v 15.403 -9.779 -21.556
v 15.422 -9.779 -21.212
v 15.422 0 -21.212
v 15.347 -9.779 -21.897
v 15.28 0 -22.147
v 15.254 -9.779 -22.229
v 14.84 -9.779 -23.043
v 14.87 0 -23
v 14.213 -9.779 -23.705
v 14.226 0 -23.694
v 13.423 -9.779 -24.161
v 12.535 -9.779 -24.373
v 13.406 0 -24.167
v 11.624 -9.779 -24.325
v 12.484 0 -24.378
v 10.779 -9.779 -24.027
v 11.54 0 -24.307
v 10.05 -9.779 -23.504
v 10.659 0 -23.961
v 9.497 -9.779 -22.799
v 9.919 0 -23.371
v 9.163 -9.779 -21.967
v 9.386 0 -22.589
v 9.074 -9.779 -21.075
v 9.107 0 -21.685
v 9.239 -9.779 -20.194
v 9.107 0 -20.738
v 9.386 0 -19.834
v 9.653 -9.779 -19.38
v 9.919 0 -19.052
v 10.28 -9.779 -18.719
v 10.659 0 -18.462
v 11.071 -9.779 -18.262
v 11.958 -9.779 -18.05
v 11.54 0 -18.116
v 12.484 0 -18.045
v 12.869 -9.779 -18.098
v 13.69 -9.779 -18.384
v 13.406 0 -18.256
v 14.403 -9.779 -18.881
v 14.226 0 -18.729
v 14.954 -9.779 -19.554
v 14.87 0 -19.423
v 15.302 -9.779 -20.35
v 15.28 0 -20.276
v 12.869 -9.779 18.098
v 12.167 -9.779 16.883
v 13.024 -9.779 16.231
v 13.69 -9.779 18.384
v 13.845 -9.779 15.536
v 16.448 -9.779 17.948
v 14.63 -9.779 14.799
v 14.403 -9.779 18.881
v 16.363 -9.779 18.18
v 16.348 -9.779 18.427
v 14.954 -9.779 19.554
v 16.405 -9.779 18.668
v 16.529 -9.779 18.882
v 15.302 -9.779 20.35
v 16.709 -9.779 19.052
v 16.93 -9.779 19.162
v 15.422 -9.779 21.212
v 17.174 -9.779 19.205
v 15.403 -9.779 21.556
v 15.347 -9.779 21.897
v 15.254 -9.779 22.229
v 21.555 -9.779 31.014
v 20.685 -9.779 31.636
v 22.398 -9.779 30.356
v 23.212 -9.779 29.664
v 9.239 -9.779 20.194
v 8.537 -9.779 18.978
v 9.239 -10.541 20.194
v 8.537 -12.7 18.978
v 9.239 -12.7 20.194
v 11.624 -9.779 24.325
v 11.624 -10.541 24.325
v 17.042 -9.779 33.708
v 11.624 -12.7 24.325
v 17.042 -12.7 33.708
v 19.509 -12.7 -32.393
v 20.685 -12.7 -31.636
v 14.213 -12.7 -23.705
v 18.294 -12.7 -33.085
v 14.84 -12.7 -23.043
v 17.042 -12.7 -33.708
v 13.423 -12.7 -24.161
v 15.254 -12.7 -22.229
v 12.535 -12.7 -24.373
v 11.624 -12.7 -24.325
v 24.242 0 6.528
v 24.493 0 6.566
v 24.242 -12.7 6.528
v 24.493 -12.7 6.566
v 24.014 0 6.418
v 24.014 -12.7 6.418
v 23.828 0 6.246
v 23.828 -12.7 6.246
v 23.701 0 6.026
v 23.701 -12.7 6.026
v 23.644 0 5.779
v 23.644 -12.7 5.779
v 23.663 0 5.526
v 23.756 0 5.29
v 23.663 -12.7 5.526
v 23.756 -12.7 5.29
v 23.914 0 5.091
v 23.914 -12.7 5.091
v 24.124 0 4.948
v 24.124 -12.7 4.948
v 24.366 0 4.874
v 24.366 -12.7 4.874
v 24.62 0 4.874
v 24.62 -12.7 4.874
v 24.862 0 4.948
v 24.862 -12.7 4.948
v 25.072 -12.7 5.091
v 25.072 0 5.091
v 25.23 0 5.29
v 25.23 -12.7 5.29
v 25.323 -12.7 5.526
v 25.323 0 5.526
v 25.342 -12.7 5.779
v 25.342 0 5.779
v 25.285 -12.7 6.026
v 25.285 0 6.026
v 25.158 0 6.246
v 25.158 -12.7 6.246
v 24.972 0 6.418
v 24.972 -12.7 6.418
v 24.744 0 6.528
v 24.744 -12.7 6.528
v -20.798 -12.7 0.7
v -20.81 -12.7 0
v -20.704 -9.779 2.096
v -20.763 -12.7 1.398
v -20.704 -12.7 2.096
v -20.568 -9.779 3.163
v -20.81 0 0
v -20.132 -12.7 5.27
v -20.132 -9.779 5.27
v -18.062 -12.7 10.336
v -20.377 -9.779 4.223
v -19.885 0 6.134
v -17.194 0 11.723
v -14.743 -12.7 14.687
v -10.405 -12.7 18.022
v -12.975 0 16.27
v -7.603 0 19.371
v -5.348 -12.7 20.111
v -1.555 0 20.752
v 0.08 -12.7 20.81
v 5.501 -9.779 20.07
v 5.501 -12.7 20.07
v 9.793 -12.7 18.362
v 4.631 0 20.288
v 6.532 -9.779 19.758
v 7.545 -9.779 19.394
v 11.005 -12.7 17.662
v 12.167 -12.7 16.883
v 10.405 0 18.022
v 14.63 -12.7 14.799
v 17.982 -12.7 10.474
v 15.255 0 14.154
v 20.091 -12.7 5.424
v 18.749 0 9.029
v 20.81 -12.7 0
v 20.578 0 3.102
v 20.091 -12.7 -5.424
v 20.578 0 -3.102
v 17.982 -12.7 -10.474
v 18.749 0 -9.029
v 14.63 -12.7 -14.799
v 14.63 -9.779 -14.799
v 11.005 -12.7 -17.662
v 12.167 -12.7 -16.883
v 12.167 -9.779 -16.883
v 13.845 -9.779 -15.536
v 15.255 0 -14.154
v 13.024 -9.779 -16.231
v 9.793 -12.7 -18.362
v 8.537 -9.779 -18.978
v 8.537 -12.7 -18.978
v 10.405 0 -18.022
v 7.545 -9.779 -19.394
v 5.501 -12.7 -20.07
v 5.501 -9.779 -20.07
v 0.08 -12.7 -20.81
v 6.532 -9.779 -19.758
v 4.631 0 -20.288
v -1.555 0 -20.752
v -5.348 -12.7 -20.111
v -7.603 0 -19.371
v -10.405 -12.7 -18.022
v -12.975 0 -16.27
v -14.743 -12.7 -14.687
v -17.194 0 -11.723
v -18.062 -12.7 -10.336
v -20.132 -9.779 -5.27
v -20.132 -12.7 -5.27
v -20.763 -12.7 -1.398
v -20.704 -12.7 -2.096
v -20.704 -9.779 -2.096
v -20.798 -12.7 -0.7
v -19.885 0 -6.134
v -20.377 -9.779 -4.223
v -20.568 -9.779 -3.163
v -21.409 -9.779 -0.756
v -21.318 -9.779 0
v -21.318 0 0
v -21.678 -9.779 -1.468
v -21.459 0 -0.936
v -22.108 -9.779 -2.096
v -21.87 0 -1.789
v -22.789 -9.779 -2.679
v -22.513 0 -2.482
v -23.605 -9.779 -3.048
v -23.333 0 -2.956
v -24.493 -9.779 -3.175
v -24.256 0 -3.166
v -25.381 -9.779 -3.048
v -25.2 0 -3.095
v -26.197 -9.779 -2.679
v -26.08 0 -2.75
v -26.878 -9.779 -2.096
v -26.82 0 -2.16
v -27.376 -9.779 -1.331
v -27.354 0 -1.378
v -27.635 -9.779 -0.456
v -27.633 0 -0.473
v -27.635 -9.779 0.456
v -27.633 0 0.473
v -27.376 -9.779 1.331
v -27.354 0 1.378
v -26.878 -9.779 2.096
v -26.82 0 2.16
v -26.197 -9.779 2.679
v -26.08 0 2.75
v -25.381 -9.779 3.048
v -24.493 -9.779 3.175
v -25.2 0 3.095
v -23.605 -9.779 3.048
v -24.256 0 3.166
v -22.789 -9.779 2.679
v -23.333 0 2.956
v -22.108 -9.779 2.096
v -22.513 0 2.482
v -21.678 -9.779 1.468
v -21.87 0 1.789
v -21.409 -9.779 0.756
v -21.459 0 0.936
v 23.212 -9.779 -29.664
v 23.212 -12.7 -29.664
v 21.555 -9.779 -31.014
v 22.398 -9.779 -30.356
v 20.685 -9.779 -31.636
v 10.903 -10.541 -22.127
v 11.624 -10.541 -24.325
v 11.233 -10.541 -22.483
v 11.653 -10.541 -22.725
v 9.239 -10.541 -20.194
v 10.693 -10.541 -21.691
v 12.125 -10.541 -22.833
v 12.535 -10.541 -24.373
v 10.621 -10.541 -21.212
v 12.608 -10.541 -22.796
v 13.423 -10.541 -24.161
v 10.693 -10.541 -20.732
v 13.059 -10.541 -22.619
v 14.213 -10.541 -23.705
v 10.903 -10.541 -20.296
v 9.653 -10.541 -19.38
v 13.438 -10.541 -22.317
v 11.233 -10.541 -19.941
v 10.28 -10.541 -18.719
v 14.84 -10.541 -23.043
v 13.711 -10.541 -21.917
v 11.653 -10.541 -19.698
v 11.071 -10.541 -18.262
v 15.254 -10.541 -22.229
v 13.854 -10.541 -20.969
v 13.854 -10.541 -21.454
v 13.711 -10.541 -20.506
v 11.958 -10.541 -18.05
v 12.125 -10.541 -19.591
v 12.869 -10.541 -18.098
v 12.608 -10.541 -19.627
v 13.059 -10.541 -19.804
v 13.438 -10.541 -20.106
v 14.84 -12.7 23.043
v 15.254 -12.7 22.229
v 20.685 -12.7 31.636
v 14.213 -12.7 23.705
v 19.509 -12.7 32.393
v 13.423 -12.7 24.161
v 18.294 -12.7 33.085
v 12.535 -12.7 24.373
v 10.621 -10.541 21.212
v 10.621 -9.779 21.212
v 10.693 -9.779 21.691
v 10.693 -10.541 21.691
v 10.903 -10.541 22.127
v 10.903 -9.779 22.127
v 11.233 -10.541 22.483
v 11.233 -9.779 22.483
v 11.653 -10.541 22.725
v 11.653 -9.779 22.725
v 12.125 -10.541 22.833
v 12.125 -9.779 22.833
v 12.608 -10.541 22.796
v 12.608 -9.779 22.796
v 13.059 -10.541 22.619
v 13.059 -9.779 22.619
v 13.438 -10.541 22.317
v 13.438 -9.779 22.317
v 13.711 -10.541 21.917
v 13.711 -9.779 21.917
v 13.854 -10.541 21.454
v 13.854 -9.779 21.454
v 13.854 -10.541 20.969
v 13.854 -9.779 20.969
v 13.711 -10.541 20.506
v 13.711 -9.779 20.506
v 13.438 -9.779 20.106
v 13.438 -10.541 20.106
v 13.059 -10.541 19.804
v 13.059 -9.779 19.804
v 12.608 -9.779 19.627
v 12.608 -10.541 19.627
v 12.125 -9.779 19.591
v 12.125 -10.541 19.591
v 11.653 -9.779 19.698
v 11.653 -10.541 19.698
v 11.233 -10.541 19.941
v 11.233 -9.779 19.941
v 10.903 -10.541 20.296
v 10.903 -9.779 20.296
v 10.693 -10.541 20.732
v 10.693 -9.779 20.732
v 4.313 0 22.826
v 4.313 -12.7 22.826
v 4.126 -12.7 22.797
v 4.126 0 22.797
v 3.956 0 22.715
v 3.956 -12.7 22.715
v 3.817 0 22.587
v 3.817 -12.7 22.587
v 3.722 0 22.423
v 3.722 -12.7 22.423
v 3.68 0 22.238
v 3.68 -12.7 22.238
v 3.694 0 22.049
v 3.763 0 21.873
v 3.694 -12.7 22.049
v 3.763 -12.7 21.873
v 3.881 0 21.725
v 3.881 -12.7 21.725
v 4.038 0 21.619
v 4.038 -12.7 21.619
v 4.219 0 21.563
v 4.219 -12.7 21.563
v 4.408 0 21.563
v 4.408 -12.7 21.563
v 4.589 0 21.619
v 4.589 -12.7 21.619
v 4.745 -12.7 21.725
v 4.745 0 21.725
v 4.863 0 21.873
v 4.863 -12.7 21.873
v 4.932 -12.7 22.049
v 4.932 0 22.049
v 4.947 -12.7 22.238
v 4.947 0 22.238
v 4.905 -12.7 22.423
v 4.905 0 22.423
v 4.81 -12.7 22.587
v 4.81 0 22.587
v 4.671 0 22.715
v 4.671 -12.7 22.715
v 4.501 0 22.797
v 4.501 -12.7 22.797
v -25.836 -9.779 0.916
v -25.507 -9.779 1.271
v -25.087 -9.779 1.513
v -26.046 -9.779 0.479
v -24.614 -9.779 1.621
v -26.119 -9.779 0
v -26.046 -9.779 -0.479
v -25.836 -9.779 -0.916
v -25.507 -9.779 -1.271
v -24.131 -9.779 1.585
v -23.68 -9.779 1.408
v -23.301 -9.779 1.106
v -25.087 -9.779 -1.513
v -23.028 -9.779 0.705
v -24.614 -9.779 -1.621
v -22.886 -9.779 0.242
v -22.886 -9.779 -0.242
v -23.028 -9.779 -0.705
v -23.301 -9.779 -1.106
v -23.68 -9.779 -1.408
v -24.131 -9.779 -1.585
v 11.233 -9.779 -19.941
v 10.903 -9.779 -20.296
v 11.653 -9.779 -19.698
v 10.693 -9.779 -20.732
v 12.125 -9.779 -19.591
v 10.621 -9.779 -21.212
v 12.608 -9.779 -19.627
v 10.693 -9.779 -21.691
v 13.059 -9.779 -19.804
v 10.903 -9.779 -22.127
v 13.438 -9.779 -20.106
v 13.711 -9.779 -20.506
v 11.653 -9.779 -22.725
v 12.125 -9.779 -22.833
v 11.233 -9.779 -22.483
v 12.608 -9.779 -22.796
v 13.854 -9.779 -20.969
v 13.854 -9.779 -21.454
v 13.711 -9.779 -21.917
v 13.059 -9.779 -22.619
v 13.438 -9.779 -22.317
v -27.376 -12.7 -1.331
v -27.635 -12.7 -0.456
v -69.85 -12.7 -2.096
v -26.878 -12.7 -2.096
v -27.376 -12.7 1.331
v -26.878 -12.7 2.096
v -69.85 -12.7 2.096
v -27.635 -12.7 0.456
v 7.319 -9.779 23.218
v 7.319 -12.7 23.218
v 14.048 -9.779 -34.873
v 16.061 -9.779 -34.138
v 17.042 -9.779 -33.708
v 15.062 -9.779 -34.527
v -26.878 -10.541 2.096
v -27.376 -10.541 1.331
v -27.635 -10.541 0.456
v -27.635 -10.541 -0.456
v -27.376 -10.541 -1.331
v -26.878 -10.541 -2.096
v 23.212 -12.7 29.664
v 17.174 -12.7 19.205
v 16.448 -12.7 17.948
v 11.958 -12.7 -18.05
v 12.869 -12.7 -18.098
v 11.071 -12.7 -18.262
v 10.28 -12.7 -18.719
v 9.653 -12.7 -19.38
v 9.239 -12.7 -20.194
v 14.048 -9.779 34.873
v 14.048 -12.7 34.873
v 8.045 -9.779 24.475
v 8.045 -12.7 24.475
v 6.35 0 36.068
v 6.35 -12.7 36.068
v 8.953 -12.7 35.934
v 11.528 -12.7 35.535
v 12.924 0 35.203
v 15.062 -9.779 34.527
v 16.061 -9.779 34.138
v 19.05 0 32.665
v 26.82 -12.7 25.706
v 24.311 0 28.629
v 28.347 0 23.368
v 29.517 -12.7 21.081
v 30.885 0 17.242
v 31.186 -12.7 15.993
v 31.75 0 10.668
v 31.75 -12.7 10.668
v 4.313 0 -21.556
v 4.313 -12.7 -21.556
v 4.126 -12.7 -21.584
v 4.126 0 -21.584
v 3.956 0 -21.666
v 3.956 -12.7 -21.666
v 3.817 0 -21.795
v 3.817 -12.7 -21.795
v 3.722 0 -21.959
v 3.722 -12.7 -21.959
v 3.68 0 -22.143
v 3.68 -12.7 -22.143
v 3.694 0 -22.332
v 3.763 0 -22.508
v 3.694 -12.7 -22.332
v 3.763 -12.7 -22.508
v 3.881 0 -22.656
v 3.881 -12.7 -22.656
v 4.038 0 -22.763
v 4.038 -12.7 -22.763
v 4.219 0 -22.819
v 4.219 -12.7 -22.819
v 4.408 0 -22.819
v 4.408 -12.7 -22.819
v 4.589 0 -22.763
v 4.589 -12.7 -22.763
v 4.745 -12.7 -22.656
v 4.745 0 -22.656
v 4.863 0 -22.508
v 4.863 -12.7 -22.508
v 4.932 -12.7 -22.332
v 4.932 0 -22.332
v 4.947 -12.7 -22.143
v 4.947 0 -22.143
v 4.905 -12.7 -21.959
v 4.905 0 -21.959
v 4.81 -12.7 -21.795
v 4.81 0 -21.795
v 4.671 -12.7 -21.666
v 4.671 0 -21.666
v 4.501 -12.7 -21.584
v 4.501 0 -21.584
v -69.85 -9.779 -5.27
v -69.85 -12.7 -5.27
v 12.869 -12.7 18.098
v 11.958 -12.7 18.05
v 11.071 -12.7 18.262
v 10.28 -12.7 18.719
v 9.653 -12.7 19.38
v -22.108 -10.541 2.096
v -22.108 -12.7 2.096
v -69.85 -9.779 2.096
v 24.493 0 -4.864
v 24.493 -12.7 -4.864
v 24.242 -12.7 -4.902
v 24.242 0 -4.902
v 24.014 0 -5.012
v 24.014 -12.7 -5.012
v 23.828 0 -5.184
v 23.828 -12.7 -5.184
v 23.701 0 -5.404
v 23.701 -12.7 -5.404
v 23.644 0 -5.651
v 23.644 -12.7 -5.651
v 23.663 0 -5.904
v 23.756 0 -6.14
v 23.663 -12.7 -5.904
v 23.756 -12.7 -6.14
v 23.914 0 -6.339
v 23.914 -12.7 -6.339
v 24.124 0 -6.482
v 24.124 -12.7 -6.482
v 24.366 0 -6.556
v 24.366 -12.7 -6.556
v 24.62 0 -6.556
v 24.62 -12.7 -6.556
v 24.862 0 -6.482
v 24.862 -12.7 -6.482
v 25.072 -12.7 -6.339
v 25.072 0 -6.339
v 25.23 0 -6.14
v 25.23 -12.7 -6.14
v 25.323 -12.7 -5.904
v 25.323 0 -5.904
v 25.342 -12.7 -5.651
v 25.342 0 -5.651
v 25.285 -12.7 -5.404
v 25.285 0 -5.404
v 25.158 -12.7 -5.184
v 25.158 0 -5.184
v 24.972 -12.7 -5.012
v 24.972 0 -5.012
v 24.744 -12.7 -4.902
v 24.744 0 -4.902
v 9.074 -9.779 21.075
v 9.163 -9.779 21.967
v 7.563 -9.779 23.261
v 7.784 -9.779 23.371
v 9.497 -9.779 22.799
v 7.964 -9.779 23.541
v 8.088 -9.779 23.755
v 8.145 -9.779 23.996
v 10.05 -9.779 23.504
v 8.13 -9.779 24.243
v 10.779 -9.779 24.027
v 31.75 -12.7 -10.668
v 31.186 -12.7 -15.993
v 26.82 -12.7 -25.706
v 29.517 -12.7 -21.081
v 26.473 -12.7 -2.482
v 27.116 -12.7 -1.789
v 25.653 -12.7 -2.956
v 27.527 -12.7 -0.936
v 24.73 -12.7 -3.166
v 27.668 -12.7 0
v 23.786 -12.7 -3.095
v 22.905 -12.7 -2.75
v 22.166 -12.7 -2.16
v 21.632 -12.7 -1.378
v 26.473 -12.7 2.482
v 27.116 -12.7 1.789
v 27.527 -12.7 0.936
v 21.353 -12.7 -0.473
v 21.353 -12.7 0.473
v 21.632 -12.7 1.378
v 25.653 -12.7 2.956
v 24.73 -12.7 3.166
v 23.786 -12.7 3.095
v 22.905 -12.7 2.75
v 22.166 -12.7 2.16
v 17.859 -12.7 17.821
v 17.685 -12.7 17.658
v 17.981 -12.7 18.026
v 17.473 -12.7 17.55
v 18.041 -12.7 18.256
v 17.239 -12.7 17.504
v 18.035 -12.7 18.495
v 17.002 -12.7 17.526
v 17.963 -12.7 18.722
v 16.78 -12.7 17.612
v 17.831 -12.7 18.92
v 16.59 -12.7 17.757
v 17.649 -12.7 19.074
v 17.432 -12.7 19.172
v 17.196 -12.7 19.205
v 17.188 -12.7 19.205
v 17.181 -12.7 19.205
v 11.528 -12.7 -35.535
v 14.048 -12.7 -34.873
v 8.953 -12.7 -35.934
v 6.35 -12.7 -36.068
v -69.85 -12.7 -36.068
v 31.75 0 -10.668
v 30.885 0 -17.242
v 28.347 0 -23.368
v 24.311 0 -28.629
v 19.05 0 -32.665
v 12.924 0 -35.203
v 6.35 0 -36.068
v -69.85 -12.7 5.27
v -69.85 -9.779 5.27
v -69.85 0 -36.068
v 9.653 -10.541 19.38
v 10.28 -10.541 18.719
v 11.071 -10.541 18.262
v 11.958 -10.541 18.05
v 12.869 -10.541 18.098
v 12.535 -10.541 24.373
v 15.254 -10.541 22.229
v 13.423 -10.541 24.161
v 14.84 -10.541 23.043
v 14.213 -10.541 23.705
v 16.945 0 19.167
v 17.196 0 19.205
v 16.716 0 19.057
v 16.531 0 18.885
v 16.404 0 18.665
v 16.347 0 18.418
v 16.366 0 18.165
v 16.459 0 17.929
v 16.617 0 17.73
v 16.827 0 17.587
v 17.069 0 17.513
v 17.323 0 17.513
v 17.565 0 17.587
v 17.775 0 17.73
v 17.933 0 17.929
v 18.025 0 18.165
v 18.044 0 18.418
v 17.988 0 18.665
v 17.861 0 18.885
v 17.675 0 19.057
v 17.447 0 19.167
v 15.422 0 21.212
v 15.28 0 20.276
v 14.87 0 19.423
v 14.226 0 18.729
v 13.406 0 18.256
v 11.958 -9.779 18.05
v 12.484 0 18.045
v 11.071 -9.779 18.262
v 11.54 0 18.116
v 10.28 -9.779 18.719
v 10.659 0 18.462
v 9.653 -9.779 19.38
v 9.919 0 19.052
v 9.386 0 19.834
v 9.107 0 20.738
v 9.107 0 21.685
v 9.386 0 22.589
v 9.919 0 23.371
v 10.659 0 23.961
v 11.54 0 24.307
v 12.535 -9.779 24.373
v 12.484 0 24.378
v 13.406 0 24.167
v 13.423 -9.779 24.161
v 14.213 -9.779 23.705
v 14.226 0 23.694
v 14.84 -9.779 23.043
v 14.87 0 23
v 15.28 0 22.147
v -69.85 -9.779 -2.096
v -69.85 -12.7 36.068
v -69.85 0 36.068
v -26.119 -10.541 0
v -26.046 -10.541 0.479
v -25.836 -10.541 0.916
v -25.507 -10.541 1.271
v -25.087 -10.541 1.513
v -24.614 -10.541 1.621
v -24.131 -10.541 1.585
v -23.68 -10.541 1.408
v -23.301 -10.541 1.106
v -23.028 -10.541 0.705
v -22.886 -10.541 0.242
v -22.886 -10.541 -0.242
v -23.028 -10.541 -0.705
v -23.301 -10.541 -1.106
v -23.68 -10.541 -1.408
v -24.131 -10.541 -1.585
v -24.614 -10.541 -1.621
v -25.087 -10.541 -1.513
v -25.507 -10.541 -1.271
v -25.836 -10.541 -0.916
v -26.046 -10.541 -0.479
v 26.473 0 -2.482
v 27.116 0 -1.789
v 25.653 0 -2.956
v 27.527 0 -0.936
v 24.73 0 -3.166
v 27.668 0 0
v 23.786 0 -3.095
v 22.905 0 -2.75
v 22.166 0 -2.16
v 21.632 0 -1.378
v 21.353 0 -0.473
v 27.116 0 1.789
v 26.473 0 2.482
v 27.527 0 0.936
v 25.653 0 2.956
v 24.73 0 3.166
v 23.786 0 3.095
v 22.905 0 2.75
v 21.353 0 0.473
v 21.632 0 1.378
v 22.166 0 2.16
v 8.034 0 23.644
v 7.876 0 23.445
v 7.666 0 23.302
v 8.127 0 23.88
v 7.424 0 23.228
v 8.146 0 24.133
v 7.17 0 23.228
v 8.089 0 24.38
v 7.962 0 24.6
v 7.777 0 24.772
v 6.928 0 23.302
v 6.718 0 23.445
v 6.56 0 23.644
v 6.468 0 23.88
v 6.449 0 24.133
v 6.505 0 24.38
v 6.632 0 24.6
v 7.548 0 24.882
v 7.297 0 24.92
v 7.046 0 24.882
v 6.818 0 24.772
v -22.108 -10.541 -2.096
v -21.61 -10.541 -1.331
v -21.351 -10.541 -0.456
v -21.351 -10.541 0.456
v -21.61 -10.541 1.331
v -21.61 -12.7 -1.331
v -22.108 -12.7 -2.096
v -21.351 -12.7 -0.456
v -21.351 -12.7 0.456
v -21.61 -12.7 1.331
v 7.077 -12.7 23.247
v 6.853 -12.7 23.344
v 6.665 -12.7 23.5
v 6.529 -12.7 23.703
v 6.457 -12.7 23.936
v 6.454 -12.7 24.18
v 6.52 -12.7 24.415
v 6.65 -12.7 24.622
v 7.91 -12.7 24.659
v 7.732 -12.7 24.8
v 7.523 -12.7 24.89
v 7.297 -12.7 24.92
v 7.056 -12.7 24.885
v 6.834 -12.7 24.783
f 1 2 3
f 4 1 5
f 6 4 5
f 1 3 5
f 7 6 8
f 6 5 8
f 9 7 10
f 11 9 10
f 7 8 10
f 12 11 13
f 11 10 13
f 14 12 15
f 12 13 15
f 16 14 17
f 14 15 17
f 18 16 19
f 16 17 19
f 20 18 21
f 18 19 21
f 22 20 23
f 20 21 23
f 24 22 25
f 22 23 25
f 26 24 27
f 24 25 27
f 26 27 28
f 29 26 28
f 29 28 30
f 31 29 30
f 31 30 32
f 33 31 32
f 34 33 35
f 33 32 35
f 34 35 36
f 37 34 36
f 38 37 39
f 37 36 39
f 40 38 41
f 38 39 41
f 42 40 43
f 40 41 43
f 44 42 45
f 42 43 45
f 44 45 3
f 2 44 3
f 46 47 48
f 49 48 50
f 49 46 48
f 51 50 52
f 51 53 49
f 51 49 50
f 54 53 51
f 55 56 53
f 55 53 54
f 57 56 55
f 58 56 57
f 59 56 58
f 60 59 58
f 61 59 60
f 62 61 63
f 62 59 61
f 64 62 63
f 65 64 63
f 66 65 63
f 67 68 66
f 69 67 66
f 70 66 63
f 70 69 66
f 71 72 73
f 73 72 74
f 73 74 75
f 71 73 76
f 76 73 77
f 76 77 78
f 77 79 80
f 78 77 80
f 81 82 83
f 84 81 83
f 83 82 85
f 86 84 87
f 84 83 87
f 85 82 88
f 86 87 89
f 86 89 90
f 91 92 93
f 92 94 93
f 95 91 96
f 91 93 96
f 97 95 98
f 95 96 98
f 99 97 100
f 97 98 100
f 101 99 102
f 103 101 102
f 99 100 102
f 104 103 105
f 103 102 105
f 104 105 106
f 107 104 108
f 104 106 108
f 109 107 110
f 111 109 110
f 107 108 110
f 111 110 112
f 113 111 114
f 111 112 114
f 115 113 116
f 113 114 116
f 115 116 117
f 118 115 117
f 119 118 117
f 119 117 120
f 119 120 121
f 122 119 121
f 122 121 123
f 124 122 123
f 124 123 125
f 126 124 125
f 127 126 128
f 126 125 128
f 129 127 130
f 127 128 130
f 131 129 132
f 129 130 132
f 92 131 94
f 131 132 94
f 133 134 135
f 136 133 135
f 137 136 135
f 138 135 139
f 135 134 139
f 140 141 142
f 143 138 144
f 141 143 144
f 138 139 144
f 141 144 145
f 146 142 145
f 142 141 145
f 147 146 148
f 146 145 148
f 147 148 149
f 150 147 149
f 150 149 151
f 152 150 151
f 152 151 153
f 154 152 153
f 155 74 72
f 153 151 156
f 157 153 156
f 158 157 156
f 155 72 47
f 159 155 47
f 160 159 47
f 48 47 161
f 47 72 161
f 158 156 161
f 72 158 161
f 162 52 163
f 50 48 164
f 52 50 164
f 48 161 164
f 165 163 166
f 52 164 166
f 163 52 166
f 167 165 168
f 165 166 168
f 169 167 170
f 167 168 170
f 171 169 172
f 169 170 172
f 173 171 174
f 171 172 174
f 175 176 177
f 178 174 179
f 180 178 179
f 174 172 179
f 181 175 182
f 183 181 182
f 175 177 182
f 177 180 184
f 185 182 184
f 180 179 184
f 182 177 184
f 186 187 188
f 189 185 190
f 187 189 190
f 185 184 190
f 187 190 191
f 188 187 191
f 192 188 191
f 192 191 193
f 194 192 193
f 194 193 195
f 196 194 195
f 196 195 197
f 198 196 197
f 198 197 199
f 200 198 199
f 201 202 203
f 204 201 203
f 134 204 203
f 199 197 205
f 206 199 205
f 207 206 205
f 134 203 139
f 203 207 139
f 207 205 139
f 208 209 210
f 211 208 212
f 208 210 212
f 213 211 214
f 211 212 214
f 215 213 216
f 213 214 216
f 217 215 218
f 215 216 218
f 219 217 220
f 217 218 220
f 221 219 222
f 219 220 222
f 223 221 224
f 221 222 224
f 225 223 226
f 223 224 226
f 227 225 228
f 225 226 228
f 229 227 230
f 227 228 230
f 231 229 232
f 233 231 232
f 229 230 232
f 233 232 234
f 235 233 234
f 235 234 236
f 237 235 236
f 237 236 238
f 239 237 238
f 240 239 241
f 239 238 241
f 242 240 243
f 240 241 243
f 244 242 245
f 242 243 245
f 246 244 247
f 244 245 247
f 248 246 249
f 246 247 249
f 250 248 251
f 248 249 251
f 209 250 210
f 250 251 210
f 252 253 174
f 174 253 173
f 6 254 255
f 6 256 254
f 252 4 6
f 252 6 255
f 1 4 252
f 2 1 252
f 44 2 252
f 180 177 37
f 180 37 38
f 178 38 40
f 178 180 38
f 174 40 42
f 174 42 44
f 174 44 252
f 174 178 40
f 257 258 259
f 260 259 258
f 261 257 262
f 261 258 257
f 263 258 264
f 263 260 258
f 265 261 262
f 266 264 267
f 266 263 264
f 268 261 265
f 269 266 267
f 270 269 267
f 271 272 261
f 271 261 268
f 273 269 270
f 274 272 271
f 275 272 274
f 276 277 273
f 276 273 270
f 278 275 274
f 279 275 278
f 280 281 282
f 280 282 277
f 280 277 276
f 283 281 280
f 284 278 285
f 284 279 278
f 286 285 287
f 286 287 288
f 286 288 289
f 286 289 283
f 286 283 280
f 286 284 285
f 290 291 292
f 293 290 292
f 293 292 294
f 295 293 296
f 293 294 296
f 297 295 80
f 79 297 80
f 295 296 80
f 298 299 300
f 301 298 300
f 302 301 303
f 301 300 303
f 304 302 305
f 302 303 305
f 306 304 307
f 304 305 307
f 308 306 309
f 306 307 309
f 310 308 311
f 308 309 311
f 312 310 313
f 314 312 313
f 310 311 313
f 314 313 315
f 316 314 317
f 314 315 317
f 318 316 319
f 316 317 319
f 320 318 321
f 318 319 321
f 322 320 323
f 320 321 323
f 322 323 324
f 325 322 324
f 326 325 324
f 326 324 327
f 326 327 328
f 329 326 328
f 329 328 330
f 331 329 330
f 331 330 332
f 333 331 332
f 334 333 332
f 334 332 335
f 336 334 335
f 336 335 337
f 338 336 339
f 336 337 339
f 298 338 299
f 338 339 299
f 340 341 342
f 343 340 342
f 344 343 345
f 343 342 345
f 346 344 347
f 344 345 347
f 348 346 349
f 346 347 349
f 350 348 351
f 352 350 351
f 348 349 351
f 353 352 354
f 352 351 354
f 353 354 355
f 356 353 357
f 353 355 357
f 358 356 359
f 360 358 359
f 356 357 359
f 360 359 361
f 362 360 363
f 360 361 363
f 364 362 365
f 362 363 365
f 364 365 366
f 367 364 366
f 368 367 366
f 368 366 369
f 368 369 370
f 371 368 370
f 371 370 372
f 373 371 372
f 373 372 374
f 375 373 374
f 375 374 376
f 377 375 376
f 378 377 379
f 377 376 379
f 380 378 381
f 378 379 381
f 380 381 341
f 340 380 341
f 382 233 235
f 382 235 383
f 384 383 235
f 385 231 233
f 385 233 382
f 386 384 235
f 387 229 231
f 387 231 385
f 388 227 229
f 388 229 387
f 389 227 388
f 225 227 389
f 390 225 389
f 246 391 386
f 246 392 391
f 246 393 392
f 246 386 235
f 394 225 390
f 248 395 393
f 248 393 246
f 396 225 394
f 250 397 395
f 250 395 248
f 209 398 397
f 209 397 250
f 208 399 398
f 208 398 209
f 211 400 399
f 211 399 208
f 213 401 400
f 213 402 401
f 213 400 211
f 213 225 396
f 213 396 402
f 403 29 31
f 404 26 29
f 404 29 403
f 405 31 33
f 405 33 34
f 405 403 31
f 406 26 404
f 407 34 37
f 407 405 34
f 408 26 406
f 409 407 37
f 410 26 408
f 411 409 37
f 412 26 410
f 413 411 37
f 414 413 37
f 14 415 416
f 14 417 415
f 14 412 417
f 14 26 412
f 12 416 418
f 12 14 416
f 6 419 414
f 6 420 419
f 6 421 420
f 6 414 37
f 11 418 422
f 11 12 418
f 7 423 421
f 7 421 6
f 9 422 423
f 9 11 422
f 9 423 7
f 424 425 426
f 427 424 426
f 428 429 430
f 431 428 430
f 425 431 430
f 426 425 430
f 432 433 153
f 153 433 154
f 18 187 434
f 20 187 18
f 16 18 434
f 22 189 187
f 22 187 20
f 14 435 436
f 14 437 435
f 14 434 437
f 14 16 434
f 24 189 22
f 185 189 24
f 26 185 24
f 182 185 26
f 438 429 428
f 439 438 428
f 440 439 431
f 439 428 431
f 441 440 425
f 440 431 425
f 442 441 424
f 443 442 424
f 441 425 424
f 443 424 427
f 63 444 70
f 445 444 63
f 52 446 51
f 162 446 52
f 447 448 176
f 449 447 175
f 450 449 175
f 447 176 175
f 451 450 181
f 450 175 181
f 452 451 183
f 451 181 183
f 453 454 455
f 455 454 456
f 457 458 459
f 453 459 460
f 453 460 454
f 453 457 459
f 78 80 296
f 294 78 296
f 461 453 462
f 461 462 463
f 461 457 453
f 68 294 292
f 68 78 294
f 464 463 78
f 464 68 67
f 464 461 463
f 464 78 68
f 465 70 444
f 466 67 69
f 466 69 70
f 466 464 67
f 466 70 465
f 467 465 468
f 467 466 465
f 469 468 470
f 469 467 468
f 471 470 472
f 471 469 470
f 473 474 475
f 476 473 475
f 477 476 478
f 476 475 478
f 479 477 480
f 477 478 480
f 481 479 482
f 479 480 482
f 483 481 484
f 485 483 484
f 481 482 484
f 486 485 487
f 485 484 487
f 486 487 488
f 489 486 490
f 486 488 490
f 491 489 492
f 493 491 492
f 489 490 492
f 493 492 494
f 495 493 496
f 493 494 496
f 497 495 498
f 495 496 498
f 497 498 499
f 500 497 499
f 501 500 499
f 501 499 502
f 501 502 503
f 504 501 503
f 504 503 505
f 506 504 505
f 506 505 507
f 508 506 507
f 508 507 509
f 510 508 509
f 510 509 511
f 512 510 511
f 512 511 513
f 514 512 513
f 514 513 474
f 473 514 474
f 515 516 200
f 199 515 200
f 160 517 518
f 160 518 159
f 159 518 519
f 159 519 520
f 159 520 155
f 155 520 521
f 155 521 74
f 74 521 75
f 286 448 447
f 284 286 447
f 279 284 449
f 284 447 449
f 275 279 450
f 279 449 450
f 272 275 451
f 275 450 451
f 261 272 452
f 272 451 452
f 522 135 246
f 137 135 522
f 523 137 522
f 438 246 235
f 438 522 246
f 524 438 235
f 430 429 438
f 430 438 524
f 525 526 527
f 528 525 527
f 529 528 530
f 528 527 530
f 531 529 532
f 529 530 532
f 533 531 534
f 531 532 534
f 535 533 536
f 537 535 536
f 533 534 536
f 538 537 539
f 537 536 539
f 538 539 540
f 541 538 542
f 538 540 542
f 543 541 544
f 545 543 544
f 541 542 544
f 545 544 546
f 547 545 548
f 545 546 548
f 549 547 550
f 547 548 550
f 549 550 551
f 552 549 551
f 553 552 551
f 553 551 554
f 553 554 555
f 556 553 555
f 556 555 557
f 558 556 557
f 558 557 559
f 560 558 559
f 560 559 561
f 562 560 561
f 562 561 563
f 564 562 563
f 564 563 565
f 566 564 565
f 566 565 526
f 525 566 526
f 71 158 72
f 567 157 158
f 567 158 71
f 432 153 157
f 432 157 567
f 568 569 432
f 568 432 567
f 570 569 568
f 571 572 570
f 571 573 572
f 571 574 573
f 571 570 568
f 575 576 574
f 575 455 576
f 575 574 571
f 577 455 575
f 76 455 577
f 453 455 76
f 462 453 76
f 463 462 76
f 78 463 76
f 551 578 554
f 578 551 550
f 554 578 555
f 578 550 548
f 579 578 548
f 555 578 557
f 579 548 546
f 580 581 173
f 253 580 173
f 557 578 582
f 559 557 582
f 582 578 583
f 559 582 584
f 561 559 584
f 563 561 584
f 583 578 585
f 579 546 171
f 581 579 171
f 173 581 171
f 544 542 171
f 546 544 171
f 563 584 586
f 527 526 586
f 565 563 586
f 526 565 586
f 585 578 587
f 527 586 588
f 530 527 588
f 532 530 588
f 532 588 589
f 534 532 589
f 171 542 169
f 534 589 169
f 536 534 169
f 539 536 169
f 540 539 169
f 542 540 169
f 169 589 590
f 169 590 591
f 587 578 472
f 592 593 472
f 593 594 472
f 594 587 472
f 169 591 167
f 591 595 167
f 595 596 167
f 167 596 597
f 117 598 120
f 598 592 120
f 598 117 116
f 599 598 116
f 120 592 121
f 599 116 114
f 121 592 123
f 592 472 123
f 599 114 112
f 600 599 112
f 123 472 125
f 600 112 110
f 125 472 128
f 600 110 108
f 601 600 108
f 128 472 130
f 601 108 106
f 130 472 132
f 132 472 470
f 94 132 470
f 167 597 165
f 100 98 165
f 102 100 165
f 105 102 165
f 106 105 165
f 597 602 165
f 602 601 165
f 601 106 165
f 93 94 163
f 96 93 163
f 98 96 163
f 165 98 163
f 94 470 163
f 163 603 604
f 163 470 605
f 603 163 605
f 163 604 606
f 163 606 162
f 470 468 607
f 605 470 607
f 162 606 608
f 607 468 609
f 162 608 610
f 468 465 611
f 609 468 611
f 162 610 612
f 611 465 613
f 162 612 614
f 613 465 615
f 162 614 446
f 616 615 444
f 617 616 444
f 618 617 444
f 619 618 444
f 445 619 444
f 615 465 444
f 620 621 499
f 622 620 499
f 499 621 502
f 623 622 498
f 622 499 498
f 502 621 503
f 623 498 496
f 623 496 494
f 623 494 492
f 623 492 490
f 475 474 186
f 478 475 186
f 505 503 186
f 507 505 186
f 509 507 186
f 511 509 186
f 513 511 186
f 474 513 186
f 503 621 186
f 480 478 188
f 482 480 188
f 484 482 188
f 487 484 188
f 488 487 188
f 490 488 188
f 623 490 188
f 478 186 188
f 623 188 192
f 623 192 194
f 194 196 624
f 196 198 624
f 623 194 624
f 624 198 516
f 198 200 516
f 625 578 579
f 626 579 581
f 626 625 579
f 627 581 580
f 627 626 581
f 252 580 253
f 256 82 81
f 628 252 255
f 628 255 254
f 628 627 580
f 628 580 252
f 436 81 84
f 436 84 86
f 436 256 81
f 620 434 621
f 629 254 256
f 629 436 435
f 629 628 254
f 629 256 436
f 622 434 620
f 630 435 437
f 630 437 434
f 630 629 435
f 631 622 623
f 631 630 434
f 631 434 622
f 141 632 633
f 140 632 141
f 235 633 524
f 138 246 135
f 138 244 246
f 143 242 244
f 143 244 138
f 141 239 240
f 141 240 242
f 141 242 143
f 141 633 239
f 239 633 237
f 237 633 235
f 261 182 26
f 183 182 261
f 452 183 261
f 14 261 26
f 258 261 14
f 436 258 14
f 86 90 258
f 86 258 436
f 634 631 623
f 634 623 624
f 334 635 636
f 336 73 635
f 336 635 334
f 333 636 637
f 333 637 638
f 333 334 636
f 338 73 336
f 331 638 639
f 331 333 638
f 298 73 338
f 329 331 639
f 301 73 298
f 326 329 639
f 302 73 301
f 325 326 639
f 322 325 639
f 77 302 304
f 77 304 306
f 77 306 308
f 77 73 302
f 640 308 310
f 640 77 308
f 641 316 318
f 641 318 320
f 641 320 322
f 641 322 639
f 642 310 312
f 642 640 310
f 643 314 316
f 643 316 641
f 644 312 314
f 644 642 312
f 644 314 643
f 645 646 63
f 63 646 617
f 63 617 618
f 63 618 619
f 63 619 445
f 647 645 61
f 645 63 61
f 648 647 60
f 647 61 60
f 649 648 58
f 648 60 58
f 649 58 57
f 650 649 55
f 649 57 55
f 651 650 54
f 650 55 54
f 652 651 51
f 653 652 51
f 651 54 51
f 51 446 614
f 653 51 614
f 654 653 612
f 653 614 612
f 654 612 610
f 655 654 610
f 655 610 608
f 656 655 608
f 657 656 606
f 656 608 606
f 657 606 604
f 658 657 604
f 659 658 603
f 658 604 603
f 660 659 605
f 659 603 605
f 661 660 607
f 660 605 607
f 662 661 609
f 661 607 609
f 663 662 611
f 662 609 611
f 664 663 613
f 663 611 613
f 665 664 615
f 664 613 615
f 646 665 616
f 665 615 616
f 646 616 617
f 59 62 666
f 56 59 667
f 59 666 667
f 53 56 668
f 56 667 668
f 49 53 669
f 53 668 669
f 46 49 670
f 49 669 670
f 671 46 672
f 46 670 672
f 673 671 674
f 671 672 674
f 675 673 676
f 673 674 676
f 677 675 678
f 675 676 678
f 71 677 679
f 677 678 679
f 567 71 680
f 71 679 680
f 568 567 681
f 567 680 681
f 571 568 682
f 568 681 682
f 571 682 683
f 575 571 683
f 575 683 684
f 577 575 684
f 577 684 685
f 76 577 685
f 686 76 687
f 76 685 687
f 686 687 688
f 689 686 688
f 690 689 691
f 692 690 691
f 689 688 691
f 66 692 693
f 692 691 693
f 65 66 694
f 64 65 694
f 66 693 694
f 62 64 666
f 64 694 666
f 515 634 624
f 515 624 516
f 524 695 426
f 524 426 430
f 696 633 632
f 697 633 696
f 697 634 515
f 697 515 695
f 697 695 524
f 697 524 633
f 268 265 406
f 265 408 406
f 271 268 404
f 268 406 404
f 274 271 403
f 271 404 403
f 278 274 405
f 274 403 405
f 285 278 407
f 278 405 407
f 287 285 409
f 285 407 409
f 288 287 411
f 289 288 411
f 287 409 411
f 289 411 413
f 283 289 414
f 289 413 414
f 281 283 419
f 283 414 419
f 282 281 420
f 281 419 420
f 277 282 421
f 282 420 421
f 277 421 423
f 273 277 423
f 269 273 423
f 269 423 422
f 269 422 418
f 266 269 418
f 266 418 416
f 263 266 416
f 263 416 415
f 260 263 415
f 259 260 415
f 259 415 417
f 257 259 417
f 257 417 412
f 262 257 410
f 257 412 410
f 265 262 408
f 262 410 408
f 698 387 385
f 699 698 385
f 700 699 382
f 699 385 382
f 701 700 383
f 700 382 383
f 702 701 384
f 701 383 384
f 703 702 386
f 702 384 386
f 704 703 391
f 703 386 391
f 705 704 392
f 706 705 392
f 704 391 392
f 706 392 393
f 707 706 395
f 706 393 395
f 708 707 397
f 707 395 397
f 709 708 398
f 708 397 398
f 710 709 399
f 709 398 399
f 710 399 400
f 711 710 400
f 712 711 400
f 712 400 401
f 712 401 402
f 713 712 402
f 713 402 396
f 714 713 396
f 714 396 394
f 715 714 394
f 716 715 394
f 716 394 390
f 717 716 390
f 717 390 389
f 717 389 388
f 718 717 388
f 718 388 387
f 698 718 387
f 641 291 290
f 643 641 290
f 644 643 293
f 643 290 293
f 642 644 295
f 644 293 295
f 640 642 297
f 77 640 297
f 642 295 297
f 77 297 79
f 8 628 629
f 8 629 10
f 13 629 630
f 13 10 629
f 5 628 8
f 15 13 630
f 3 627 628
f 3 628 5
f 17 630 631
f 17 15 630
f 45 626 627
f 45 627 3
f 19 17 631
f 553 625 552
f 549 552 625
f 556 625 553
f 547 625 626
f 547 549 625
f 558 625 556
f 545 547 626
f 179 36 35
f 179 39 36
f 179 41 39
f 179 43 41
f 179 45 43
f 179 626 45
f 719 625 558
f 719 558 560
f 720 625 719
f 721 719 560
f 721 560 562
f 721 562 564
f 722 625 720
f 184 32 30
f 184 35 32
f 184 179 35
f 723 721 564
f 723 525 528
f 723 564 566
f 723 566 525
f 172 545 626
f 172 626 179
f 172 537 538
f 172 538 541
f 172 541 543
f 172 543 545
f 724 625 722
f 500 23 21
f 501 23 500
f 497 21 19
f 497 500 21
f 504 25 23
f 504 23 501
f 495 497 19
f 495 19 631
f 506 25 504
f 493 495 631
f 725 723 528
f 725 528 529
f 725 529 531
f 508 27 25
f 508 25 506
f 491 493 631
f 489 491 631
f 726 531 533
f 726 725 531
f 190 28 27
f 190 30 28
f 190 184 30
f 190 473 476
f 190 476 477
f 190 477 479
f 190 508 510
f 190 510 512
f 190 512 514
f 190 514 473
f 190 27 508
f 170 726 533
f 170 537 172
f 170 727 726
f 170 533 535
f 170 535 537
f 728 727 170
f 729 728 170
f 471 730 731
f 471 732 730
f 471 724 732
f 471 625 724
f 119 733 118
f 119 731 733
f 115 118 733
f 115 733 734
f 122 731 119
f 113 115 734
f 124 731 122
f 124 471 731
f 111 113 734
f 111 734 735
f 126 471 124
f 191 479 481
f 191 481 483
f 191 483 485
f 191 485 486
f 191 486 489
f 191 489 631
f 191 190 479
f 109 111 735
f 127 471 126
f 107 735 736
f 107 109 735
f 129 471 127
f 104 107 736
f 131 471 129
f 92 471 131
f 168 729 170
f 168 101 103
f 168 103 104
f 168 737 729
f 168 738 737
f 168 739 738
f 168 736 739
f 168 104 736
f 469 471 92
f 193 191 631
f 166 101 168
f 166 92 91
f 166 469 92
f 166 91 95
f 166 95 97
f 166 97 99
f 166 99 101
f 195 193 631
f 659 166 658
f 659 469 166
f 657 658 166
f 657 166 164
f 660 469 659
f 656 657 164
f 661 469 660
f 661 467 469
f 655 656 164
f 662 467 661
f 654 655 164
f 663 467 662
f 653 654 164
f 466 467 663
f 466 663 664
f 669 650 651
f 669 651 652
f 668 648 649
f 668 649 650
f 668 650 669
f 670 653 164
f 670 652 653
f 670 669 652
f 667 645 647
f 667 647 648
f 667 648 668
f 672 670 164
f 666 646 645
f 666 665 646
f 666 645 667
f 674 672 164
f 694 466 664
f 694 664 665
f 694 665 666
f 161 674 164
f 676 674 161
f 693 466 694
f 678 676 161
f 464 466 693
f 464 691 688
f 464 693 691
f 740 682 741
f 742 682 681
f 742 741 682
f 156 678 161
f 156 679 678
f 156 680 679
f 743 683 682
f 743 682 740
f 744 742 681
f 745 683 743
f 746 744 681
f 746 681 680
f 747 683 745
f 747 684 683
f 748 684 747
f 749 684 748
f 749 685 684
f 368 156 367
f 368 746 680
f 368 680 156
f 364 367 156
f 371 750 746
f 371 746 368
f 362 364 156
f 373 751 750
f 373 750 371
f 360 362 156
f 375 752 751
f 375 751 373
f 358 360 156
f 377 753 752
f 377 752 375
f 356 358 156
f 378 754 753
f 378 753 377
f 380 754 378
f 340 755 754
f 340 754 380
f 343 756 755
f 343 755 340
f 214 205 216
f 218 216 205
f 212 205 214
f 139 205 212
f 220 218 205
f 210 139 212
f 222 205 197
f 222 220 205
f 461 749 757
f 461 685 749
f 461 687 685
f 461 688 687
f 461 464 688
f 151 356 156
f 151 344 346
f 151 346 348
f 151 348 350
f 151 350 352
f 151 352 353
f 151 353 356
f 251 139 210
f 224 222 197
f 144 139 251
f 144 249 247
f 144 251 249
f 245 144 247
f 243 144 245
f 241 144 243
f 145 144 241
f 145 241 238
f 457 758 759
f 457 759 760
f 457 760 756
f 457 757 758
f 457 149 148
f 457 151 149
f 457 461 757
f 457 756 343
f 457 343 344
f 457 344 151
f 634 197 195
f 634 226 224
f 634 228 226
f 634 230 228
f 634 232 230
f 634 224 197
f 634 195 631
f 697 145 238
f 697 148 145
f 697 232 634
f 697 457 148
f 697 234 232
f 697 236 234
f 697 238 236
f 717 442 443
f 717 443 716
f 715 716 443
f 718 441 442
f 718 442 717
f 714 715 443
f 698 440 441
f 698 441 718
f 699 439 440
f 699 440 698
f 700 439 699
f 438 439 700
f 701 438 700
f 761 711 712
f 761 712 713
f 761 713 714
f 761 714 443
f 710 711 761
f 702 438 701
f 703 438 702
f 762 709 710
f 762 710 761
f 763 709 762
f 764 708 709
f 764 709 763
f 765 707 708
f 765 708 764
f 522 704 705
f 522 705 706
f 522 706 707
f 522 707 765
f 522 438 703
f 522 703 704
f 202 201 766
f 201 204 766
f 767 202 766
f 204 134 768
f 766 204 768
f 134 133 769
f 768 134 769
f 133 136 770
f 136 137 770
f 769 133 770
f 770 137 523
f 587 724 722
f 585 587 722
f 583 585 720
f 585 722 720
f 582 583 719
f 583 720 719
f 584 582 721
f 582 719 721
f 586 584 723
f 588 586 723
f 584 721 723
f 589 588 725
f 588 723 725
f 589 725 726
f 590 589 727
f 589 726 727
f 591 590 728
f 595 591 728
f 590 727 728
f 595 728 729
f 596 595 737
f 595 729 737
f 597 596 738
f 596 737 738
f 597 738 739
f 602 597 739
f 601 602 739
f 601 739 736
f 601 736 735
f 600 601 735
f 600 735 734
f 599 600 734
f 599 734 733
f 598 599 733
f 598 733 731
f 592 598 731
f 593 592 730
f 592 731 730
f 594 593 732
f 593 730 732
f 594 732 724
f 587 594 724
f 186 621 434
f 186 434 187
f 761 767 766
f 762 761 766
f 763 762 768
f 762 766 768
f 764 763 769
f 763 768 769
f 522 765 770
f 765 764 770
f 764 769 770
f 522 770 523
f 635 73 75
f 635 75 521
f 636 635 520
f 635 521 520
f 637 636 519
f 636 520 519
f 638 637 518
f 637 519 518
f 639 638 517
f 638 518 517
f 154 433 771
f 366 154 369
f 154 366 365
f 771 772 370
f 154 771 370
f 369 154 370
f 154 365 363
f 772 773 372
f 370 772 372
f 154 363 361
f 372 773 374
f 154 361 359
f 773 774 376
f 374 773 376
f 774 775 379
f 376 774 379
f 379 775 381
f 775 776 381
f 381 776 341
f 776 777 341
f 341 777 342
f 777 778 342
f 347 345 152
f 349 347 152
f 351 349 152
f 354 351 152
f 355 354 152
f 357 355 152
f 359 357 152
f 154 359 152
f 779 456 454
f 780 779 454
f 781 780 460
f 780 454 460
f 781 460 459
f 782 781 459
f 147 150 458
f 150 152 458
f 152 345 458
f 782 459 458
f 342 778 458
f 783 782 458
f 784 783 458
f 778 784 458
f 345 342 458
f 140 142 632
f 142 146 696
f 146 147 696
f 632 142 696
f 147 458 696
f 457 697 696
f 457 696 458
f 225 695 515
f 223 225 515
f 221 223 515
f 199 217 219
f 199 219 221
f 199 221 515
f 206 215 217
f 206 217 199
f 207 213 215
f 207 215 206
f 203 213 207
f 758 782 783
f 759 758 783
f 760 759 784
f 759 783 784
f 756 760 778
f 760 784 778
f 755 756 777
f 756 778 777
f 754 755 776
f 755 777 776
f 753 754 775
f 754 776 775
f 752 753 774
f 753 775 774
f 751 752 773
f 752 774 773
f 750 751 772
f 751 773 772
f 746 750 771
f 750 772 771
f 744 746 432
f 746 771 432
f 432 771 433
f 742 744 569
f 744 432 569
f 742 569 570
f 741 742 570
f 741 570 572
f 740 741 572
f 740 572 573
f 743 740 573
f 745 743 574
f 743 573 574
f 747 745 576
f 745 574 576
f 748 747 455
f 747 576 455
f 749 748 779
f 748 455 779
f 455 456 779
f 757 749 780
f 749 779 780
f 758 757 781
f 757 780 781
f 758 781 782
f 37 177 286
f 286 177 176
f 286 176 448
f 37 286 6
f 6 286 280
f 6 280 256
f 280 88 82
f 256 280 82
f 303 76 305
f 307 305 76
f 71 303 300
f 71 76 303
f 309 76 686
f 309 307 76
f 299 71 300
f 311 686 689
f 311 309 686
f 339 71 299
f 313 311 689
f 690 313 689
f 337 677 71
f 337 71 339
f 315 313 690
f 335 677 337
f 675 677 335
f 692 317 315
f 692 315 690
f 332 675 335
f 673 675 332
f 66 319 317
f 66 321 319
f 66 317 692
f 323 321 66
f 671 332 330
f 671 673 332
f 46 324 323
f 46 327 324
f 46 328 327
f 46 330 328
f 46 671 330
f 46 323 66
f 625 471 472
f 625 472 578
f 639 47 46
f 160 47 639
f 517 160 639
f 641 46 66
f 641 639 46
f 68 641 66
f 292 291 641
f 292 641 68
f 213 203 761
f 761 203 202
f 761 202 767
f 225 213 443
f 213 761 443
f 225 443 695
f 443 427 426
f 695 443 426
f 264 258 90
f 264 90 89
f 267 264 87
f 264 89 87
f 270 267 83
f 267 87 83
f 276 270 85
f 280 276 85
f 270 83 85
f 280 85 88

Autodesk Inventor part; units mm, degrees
ref_plane "YZ Plane" through (0, 0, 0) normal (1, 0, 0) x (0, 1, 0)
ref_plane "XZ Plane" through (0, 0, 0) normal (0, 1, 0) x (-1, 0, 0)
ref_plane "XY Plane" through (0, 0, 0) normal (0, 0, 1) x (1, 0, 0)
sketch "Sketch1" plane through (0, 0, 0) normal (0, 1, 0) x (-1, 0, 0)
  line L0 (-54.2742, 0) -> (84.3226, 0) construction
  line L1 (-6.35, -36.068) -> (69.85, -36.068)
  line L2 (69.85, -36.068) -> (69.85, 36.068)
  line L3 (69.85, 36.068) -> (-6.35, 36.068)
  line L4 (-31.75, 10.668) -> (-31.75, -10.668)
  circle A0 centre (0, 0) radius 17 construction
  circle A1 centre (0, 0) radius 20.81
  line L5 (0, 0) -> (-18.9066, 32.7472) construction
  circle A2 centre (0, 0) radius 3.81 construction
  arc A3 (-6.35, 36.068) -> (-31.75, 10.668) centre (-6.35, 10.668) ccw
  arc A4 (-31.75, -10.668) -> (-6.35, -36.068) centre (-6.35, -10.668) ccw
  circle A5 centre (-12.2465, 21.2116) radius 1.6256
  line L6 (0, 0) -> (31.1733, 53.9938) construction
  circle A6 centre (24.493, 0) radius 1.6256
  circle A7 centre (-12.2465, -21.2116) radius 1.6256
  circle A8 centre (-12.2465, 21.2116) radius 3.175 construction
  line L7 (-57.1489, 10.668) -> (-67.0521, 10.668)
  line L8 (-67.0521, 10.668) -> (-67.0521, -7.3902)
  line L9 (-67.0521, -7.3902) -> (-57.1489, -7.3902)
  line L10 (-57.1489, -7.3902) -> (-57.1489, 10.668)
  point P0 (-31.75, -36.068)
  point P1 (-31.75, 36.068)
  dimension "d0" = 72.136
  dimension "d1" = 101.6
  dimension "d2" = 34
  dimension "d3" = 3.81
  dimension "d4" = 31.75
  dimension "tri_angle" = 120
  dimension "fov_diameter" = 7.62
  dimension "d9" = 25.4
  dimension "d12" = 3.2512
  dimension "mount_radius" = 24.493
  dimension "d14" = 60
  dimension "d25" = 6.35
  dimension "main_aperture_diameter" = 41.62
  dimension "d67" = 2.0574
  dimension "d68" = 10.94
extrude "Extrusion2" add sketch "Sketch1" against normal blind 12.7 contours A4 L4 A3 L3 L2 L1
sketch "Sketch2" plane through (0, -12.7, 0) normal (0, -1, 0) x (1, 0, 0)
  line L0 (0, 0) -> (-53.7265, 0) construction
  circle A0 centre (0, 0) radius 20.81 projected
  circle A1 centre (12.2465, -21.2116) radius 1.6256 projected
  circle A2 centre (-24.493, 0) radius 1.6256 projected
  circle A3 centre (12.2465, 21.2116) radius 1.6256 projected
  line L1 (-69.85, 36.068) -> (-69.85, -36.068) projected
  line L2 (6.35, 36.068) -> (-69.85, 36.068) projected
  arc A4 (31.75, 10.668) -> (6.35, 36.068) centre (6.35, 10.668) ccw projected
  line L3 (31.75, -10.668) -> (31.75, 10.668) projected
  arc A5 (6.35, -36.068) -> (31.75, -10.668) centre (6.35, -10.668) ccw projected
  line L4 (-69.85, -36.068) -> (6.35, -36.068) projected
  line L5 (54.2742, 0) -> (-84.3226, 0) construction
  line L6 (0, 0) -> (-31.1733, 53.9938) construction
  circle A6 centre (0, 0) radius 17 construction
  circle A7 centre (0, 0) radius 3.81 construction
  line L7 (0, 0) -> (18.9066, 32.7472) construction
  line L8 (41.6502, 64.7743) -> (11.4877, 12.5313) construction
  line L9 (11.4877, 12.5313) -> (41.6502, 64.7743) construction
  line L10 (10.1129, 13.325) -> (40.2754, 65.568)
  line L11 (43.025, 63.9805) -> (12.8625, 11.7375)
  arc A8 (10.1129, 13.325) -> (12.8625, 11.7375) centre (11.4877, 12.5313) ccw
  arc A9 (43.025, 63.9805) -> (40.2754, 65.568) centre (41.6502, 64.7743) ccw
  line L12 (6.4834, 15.4205) -> (36.6459, 67.6635)
  line L13 (33.8962, 69.251) -> (3.7337, 17.008)
  arc A10 (3.7337, 17.008) -> (6.4834, 15.4205) centre (5.1086, 16.2143) ccw
  arc A11 (36.6459, 67.6635) -> (33.8962, 69.251) centre (35.2711, 68.4573) ccw
  line L14 (10.1129, -13.325) -> (40.2754, -65.568)
  line L15 (43.025, -63.9805) -> (12.8625, -11.7375)
  arc A12 (12.8625, -11.7375) -> (10.1129, -13.325) centre (11.4877, -12.5313) ccw
  arc A13 (40.2754, -65.568) -> (43.025, -63.9805) centre (41.6502, -64.7743) ccw
  arc A14 (33.8962, -69.251) -> (36.6459, -67.6635) centre (35.2711, -68.4573) ccw
  line L16 (33.8962, -69.251) -> (3.7337, -17.008)
  arc A15 (6.4834, -15.4205) -> (3.7337, -17.008) centre (5.1086, -16.2143) ccw
  line L17 (6.4834, -15.4205) -> (36.6459, -67.6635)
  line L18 (-16.5962, -2.0955) -> (-76.9212, -2.0955)
  line L19 (-76.9212, -5.2705) -> (-16.5962, -5.2705)
  arc A16 (-16.5962, -5.2705) -> (-16.5962, -2.0955) centre (-16.5962, -3.683) ccw
  arc A17 (-76.9212, -2.0955) -> (-76.9212, -5.2705) centre (-76.9212, -3.683) ccw
  arc A18 (-76.9212, 5.2705) -> (-76.9212, 2.0955) centre (-76.9212, 3.683) ccw
  line L20 (-76.9212, 5.2705) -> (-16.5962, 5.2705)
  arc A19 (-16.5962, 2.0955) -> (-16.5962, 5.2705) centre (-16.5962, 3.683) ccw
  line L21 (-16.5962, 2.0955) -> (-76.9212, 2.0955)
  point P0 (26.5689, 38.6528)
  dimension "d20" = 3.683
  dimension "pin_diameter" = 3.175
  dimension "d28" = 63.5
extrude "Extrusion3" cut sketch "Sketch2" against normal blind 2.921 contours L11 A8 L10 A0 | A0 L10 A4 L11 | L15 A5 L14 A0 | A0 L14 A12 L15 | A4 L10 A9 L11 | L15 A13 L14 A5 | L12 A10 L13 A0 | A0 L13 A4 L12 | L17 A5 L16 A0 | A0 L16 A15 L17 | A4 L13 A11 L12 | L17 A14 L16 A5 | L20 A19 L21 A0 | A0 L21 L1 L20 | L19 L1 L18 A0 | A0 L18 A16 L19 | L1 L21 A18 L20 | L19 A17 L18 L1
sketch "Sketch3" plane through (0, 0, 0) normal (0, 1, 0) x (1, 0, 0)
  circle A0 centre (12.2465, -21.2116) radius 3.175 construction
  circle A1 centre (12.2465, -21.2116) radius 3.175
  line L0 (54.2742, 0) -> (-84.3226, 0) construction
  line L1 (0, 0) -> (-31.1733, -53.9938) construction
  circle A2 centre (12.2465, 21.2116) radius 3.175
  circle A3 centre (-24.493, 0) radius 3.175
extrude "Extrusion4" cut sketch "Sketch3" against normal blind 9.779
sketch "Sketch4" plane through (0, 0, 0) normal (0, 1, 0) x (1, 0, 0)
  line L0 (54.2742, 0) -> (-84.3226, 0) construction
  line L1 (-63.5, -29.1592) -> (-12.7, -29.1592) construction
  line L2 (-63.5, -26.67) -> (-12.7, -26.67)
  line L3 (-12.7, -31.6484) -> (-63.5, -31.6484)
  arc A0 (-63.5, -26.67) -> (-63.5, -31.6484) centre (-63.5, -29.1592) ccw
  arc A1 (-12.7, -31.6484) -> (-12.7, -26.67) centre (-12.7, -29.1592) ccw
  line L4 (-63.5, 26.67) -> (-12.7, 26.67)
  line L5 (-12.7, 31.6484) -> (-63.5, 31.6484)
  arc A2 (-63.5, 31.6484) -> (-63.5, 26.67) centre (-63.5, 29.1592) ccw
  arc A3 (-12.7, 26.67) -> (-12.7, 31.6484) centre (-12.7, 29.1592) ccw
  point P0 (0, 0)
  point P1 (-38.1, -29.1592)
  dimension "d33" = 4.9784
  dimension "d34" = 50.8
  dimension "d35" = 58.3184
  dimension "d36" = 12.7
sketch "Sketch5" plane through (0, -12.7, 0) normal (0, -1, 0) x (1, 0, 0)
  circle A0 centre (12.2465, 21.2116) radius 1.6256 projected
  line L0 (0, 0) -> (18.9066, 32.7472) construction
  line L1 (54.2742, 0) -> (-84.3226, 0) construction
  line L2 (0, 0) -> (-31.1733, 53.9938) construction
  circle A1 centre (12.2465, 21.2116) radius 3.175 construction
  line L3 (9.4969, 22.7991) -> (6.9569, 18.3997)
  line L4 (14.9961, 19.6241) -> (12.4561, 15.2247)
  line L5 (6.9569, 18.3997) -> (12.4561, 15.2247)
  arc A2 (14.9961, 19.6241) -> (9.4969, 22.7991) centre (12.2465, 21.2116) ccw
  line L6 (-24.493, 3.175) -> (-19.413, 3.175)
  line L7 (-24.493, -3.175) -> (-19.413, -3.175)
  line L8 (-19.413, 3.175) -> (-19.413, -3.175)
  arc A3 (-24.493, 3.175) -> (-24.493, -3.175) centre (-24.493, 0) ccw
  line L9 (9.4969, -22.7991) -> (6.9569, -18.3997)
  line L10 (14.9961, -19.6241) -> (12.4561, -15.2247)
  line L11 (6.9569, -18.3997) -> (12.4561, -15.2247)
  arc A4 (9.4969, -22.7991) -> (14.9961, -19.6241) centre (12.2465, -21.2116) ccw
  dimension "d50" = 5.08
extrude "Extrusion6" [suppressed]
extrude "Extrusion7" [suppressed]
sketch "Sketch6" plane through (0, 0, 0) normal (0, 1, 0) x (1, 0, 0)
  line L0 (0, 0) -> (18.9066, -32.7472) construction
  line L1 (41.6502, -64.7743) -> (11.4877, -12.5313) construction
  line L2 (0, 0) -> (33.579, -42.2146) construction
  circle A0 centre (15.5113, -19.5004) radius 3.175
  circle A1 centre (9.1322, -23.1834) radius 3.175
  line L3 (0, 0) -> (-31.1733, -53.9938) construction
  line L4 (54.2742, 0) -> (-84.3226, 0) construction
  circle A2 centre (-24.6435, 3.683) radius 3.175
  circle A3 centre (-24.6435, -3.683) radius 3.175
  circle A4 centre (15.5113, 19.5004) radius 3.175
  circle A5 centre (9.1322, 23.1834) radius 3.175
  dimension "d45" = 8.5
  dimension "d46" = 6.35
extrude "Extrusion8" [suppressed]
chamfer "Chamfer2" [suppressed]
sketch "Sketch7" plane through (0, -12.7, 0) normal (0, -1, 0) x (1, 0, 0)
  line L0 (0, 0) -> (-31.1733, 53.9938) construction
  line L1 (0, 0) -> (18.9066, 32.7472) construction
  circle A0 centre (12.2465, 21.2116) radius 3.175
  circle A1 centre (-24.493, 0) radius 3.175
  line L2 (54.2742, 0) -> (-84.3226, 0) construction
  circle A2 centre (12.2465, -21.2116) radius 3.175
  dimension "d54" = 6.35
extrude "Extrusion9" cut sketch "Sketch7" against normal blind 2.159
sketch "Sketch8" plane through (0, 0, 0) normal (0, 1, 0) x (1, 0, 0)
  circle A0 centre (0, 0) radius 20.81 projected
  line L0 (54.2742, 0) -> (-84.3226, 0) construction
  line L1 (0, 0) -> (12.8396, -66.0541) construction
  point P0 (4.3134, -22.1907)
  point P1 (4.3134, 22.1907)
  dimension "d57" = 101
  dimension "d58" = 22.606
hole "Hole1" at (4.3134, 0, 22.1907) at (4.3134, 0, -22.1907) direction (0, -1, 0) diameter 1.27 depth 25.4 tip angle 118
sketch "Sketch9" plane through (0, 0, 0) normal (0, 1, 0) x (1, 0, 0)
  line L0 (0, 0) -> (22.9874, -39.8154) construction
  line L1 (15.2539, -22.2295) -> (20.6849, -31.6363) projected
  circle A0 centre (12.2465, -21.2116) radius 3.175 projected
  line L2 (12.2465, -21.2116) -> (22.1452, -15.4966) construction
  point P0 (17.1958, -18.3541)
  point P1 (7.2972, -24.0691)
  dimension "d69" = 11.43
hole "Hole2" at (17.1958, 0, 18.3541) at (7.2972, 0, 24.0691) direction (0, -1, 0) diameter 1.7018 depth 12.7 tip angle 118
sketch "Sketch10" plane through (0, 0, 0) normal (0, 1, 0) x (1, 0, 0)
  circle A0 centre (-24.493, 0) radius 3.175 projected
  line L0 (0, 50.4952) -> (0, -50.4952) projected
  line L1 (0, 0) -> (18.9066, -32.7472) construction
  circle A1 centre (24.493, 0) radius 3.175
  line L2 (0, 0) -> (37.8406, -21.8473) construction
  point P0 (7.2972, -24.0691)
  point P1 (17.1958, -18.3541)
  point P2 (24.493, 5.715)
  point P3 (24.493, -5.715)
  dimension "d77" = 30
extrude "Extrusion10" cut sketch "Sketch10" against normal blind 25.4 contours A1
sketch "Sketch11" plane through (0, 0, 0) normal (0, 1, 0) x (1, 0, 0)
  point P0 (0, 0)
  point P1 (24.493, -5.715)
  point P2 (24.493, 5.715)
hole "Hole3" at (24.493, 0, 5.715) at (24.493, 0, -5.715) direction (0, -1, 0) diameter 1.7018 depth 12.7 tip angle 118
equation "\"fov_diameter\" = 2 * d3"
equation "\"d14\" = 0.5 * tri_angle"
equation "\"d15\" = plate_thickness"
equation "\"d23\" = pin_depth"
equation "\"d26\" = magnet_depth"
equation "\"d40\" = bearing_relief_depth"
equation "\"d46\" = magnet_diameter"
equation "\"d47\" = magnet_depth"
equation "\"d54\" = magnet_diameter"
equation "\"d55\" = bearing_relief_depth"
equation "\"plate_thickness\" = 12.7"
equation "\"magnet_depth\" = plate_thickness - pin_depth"
equation "\"hole_diameter\" = d2 + fov_diameter"
equation "\"pin_depth\" = 2.921"
equation "\"bearing_relief_depth\" = 2.159"
equation "\"magnet_diameter\" = 6.35"
properties part number "tri_mount"
